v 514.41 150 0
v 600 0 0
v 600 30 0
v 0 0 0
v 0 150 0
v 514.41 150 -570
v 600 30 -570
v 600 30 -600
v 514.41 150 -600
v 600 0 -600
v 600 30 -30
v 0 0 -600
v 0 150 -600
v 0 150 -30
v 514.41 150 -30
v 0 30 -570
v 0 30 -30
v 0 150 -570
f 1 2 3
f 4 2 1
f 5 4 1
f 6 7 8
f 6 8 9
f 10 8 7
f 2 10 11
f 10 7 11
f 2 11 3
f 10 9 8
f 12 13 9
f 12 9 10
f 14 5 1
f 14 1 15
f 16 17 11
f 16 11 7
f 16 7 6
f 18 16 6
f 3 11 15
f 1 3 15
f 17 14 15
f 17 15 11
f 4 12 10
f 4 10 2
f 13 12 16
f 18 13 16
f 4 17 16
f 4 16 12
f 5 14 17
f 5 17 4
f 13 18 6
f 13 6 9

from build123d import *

# Parameters (mm, degrees)
BOSS_EXTRUDE1_DEPTH     = 600
CUT_EXTRUDE1_DEPTH      = 600
CUT_EXTRUDE1_DEPTH_BACK = 600


with BuildPart() as part:
    # Sketch1 → Boss-Extrude1 (new body)
    with BuildSketch(Plane(origin=(0, 0, 0), x_dir=(0, 0, -1), z_dir=(1, 0, 0))):
        Polygon((30, 150), (30, 30), (570, 30), (570, 150), (600, 150), (600, 0), (0, 0), (0, 150), align=None)
    extrude(amount=BOSS_EXTRUDE1_DEPTH)

    # Sketch4 → Cut-Extrude1 (cut, two sides)
    with BuildSketch(Plane(origin=(0, 0, -30), x_dir=(-1, 0, 0), z_dir=(0, 0, -1))) as cut_extrude1_sk:
        Polygon((-600, 30), (-514.410107884, 150), (-600, 150), align=None)
    extrude(amount=CUT_EXTRUDE1_DEPTH, mode=Mode.SUBTRACT)
    extrude(cut_extrude1_sk.sketch, amount=-CUT_EXTRUDE1_DEPTH_BACK, mode=Mode.SUBTRACT)


solid = part.part
